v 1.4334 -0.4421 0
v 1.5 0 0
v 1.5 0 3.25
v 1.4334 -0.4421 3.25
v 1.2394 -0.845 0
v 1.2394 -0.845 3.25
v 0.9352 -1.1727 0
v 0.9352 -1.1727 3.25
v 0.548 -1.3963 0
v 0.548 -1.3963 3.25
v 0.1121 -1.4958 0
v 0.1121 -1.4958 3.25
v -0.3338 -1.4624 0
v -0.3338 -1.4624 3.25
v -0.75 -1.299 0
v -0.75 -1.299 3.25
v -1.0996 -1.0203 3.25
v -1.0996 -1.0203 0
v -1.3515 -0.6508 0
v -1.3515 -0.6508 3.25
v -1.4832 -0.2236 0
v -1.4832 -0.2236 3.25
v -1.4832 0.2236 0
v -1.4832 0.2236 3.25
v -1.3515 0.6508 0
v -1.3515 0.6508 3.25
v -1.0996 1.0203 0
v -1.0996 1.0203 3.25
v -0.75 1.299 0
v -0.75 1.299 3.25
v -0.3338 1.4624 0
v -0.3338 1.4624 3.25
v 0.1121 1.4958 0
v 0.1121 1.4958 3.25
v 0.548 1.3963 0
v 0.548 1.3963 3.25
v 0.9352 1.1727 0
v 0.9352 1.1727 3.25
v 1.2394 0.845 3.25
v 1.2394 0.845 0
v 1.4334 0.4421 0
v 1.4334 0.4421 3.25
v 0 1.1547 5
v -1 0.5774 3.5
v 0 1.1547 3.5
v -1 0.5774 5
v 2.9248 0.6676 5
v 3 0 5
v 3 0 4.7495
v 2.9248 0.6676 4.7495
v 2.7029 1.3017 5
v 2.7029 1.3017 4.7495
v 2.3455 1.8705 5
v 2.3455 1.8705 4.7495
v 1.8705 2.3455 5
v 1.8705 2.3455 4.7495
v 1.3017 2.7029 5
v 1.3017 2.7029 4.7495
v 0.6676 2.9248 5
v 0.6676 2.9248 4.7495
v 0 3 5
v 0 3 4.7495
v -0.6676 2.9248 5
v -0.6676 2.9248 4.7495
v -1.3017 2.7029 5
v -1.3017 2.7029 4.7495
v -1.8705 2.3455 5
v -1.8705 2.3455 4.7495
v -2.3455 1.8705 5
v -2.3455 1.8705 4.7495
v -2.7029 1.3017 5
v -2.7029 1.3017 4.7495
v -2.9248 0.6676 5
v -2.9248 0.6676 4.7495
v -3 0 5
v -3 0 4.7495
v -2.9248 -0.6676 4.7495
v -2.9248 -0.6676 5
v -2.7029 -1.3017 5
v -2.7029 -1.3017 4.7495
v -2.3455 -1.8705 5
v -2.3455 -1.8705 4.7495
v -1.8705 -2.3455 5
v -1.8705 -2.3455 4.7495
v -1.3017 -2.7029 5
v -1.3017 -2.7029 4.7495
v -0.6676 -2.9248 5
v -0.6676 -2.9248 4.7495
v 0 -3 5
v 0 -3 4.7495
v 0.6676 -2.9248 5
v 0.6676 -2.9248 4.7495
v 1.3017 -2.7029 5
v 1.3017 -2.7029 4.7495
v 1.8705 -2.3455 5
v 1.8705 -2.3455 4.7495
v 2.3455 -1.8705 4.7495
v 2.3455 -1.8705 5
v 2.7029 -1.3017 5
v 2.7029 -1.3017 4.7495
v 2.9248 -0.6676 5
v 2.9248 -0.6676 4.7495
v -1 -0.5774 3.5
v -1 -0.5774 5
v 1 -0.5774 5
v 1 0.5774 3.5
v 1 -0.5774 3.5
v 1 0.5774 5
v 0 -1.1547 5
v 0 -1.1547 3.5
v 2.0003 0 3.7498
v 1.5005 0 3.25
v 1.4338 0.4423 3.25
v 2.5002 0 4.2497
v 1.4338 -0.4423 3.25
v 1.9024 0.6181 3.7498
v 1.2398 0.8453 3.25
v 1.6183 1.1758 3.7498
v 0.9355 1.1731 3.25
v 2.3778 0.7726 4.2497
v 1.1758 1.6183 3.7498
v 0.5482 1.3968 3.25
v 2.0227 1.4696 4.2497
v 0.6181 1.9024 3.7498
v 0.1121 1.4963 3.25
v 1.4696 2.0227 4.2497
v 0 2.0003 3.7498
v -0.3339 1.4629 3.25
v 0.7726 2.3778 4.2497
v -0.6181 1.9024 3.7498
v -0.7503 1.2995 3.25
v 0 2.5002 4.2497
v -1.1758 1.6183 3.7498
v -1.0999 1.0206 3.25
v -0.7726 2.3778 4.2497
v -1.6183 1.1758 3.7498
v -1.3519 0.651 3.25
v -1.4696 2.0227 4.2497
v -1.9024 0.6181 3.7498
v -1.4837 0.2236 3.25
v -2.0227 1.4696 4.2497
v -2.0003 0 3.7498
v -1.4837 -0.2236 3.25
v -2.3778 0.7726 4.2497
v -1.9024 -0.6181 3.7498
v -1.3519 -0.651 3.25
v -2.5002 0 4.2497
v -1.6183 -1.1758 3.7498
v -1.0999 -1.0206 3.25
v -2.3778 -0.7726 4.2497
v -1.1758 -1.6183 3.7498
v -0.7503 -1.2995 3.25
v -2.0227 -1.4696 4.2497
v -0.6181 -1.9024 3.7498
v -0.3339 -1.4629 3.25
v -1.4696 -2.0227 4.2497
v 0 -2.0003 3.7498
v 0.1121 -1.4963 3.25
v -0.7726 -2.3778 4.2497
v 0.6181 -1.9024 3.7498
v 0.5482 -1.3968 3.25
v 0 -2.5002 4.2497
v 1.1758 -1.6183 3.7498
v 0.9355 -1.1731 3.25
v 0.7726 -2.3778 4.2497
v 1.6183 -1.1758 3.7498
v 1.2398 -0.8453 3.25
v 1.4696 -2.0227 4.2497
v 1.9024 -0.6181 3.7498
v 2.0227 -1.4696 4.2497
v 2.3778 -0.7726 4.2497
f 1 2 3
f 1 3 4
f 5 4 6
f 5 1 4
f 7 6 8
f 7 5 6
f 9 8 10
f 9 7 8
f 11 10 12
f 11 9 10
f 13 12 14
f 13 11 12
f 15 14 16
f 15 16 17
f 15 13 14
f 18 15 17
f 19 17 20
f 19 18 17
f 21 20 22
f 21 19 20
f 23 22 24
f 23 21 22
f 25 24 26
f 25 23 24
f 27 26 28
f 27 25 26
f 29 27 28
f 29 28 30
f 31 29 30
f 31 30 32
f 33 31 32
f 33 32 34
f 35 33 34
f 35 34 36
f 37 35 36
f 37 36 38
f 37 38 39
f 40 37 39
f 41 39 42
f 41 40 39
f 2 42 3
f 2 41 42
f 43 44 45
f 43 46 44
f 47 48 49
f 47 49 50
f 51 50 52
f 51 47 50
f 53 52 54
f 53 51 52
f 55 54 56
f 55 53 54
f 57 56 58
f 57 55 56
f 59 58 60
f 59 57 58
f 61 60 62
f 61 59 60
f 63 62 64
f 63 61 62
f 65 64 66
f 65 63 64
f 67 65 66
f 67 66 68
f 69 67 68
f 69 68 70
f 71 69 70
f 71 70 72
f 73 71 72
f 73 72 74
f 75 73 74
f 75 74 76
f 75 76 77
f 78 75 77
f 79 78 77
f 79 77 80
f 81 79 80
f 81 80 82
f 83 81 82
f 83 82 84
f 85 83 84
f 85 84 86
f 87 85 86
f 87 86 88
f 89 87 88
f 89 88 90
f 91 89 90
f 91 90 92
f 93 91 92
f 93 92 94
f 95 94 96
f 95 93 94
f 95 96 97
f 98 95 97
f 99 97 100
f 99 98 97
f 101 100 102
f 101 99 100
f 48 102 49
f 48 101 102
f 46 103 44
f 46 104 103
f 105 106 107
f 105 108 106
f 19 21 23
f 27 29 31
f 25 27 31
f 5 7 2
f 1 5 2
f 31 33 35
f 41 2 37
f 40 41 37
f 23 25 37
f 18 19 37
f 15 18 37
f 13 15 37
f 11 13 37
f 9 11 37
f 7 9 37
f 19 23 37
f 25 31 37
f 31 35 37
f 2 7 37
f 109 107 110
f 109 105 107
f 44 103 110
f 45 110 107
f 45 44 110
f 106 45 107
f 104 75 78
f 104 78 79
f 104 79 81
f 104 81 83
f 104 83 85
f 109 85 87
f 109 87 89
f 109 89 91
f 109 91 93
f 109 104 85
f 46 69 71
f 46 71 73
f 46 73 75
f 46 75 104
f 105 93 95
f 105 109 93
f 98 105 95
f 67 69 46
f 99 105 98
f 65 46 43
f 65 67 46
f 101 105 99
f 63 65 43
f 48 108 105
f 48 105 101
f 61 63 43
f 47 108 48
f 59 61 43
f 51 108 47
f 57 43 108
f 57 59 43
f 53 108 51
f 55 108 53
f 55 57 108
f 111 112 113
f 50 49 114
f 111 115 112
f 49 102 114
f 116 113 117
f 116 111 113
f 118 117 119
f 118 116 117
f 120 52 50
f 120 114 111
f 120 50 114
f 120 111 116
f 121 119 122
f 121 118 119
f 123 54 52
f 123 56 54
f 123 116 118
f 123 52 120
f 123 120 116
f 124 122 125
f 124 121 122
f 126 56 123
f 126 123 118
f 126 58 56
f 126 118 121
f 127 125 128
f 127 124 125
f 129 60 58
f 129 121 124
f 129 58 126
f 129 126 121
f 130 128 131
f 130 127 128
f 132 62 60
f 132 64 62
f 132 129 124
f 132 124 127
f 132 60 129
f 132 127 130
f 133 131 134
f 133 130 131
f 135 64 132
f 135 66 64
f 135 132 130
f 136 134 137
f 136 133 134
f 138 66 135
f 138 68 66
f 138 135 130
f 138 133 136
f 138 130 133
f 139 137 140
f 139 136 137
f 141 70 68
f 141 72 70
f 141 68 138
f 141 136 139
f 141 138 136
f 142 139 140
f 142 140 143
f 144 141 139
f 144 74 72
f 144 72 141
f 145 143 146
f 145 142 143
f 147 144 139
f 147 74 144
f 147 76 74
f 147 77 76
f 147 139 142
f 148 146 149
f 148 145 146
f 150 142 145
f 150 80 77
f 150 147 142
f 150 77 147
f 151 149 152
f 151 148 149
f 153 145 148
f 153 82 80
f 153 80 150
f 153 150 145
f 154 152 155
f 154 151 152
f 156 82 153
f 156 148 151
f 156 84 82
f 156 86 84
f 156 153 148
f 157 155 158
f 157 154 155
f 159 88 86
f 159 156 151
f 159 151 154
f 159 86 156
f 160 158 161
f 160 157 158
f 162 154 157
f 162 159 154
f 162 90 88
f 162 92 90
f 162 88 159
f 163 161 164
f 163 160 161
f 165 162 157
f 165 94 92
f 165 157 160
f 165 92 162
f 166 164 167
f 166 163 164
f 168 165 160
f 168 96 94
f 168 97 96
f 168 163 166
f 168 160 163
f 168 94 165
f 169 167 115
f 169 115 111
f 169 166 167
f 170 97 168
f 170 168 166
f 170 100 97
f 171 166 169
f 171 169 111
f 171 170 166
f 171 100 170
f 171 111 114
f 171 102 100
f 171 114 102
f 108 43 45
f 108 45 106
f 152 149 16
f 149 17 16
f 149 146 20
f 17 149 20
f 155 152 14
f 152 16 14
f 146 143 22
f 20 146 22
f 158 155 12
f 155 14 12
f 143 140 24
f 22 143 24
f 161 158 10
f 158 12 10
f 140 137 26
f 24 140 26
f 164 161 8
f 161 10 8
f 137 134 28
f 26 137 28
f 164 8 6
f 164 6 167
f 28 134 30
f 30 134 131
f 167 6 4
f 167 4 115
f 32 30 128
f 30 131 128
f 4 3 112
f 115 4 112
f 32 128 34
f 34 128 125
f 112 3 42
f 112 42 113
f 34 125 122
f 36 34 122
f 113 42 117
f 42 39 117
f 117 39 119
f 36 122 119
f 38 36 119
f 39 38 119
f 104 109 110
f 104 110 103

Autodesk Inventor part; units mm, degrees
ref_plane "YZ Plane" through (0, 0, 0) normal (1, 0, 0) x (0, 1, 0)
ref_plane "XZ Plane" through (0, 0, 0) normal (0, 1, 0) x (-1, 0, 0)
ref_plane "XY Plane" through (0, 0, 0) normal (0, 0, 1) x (1, 0, 0)
sketch "スケッチ1" plane through (0, 0, 0) normal (0, 0, 1) x (1, 0, 0)
  circle A0 centre (0, 0) radius 1.5
  dimension "d0" = 3
extrude "押し出し1" add sketch "スケッチ1" along normal blind 5
thread "ねじ1" size "M3x0.5" class "6g" standard "ANSI Metric M Profile" full length
sketch "スケッチ2" plane through (0, 0, 5) normal (0, 0, 1) x (1, 0, 0)
  circle A0 centre (0, 0) radius 3
  dimension "d5" = 6
extrude "押し出し2" add sketch "スケッチ2" against normal blind 1.75
chamfer "面取り1" distance 1.5 angle 45 1 edges at (-3, 0, 3.25)
sketch "スケッチ3" plane through (0, 0, 5) normal (0, 0, 1) x (1, 0, 0)
  line L0 (0, 1.1547) -> (1, 0.5774)
  line L1 (1, 0.5774) -> (1, -0.5774)
  line L2 (1, -0.5774) -> (0, -1.1547)
  line L3 (0, -1.1547) -> (-1, -0.5774)
  line L4 (-1, -0.5774) -> (-1, 0.5774)
  line L5 (-1, 0.5774) -> (0, 1.1547)
  point P0 (0, 0)
  point P1 (0, 0)
  dimension "d11" = 2
extrude "押し出し3" cut sketch "スケッチ3" against normal blind 1.5
properties part number "m3皿ネジ5 (1)" material "鉄 灰色"
